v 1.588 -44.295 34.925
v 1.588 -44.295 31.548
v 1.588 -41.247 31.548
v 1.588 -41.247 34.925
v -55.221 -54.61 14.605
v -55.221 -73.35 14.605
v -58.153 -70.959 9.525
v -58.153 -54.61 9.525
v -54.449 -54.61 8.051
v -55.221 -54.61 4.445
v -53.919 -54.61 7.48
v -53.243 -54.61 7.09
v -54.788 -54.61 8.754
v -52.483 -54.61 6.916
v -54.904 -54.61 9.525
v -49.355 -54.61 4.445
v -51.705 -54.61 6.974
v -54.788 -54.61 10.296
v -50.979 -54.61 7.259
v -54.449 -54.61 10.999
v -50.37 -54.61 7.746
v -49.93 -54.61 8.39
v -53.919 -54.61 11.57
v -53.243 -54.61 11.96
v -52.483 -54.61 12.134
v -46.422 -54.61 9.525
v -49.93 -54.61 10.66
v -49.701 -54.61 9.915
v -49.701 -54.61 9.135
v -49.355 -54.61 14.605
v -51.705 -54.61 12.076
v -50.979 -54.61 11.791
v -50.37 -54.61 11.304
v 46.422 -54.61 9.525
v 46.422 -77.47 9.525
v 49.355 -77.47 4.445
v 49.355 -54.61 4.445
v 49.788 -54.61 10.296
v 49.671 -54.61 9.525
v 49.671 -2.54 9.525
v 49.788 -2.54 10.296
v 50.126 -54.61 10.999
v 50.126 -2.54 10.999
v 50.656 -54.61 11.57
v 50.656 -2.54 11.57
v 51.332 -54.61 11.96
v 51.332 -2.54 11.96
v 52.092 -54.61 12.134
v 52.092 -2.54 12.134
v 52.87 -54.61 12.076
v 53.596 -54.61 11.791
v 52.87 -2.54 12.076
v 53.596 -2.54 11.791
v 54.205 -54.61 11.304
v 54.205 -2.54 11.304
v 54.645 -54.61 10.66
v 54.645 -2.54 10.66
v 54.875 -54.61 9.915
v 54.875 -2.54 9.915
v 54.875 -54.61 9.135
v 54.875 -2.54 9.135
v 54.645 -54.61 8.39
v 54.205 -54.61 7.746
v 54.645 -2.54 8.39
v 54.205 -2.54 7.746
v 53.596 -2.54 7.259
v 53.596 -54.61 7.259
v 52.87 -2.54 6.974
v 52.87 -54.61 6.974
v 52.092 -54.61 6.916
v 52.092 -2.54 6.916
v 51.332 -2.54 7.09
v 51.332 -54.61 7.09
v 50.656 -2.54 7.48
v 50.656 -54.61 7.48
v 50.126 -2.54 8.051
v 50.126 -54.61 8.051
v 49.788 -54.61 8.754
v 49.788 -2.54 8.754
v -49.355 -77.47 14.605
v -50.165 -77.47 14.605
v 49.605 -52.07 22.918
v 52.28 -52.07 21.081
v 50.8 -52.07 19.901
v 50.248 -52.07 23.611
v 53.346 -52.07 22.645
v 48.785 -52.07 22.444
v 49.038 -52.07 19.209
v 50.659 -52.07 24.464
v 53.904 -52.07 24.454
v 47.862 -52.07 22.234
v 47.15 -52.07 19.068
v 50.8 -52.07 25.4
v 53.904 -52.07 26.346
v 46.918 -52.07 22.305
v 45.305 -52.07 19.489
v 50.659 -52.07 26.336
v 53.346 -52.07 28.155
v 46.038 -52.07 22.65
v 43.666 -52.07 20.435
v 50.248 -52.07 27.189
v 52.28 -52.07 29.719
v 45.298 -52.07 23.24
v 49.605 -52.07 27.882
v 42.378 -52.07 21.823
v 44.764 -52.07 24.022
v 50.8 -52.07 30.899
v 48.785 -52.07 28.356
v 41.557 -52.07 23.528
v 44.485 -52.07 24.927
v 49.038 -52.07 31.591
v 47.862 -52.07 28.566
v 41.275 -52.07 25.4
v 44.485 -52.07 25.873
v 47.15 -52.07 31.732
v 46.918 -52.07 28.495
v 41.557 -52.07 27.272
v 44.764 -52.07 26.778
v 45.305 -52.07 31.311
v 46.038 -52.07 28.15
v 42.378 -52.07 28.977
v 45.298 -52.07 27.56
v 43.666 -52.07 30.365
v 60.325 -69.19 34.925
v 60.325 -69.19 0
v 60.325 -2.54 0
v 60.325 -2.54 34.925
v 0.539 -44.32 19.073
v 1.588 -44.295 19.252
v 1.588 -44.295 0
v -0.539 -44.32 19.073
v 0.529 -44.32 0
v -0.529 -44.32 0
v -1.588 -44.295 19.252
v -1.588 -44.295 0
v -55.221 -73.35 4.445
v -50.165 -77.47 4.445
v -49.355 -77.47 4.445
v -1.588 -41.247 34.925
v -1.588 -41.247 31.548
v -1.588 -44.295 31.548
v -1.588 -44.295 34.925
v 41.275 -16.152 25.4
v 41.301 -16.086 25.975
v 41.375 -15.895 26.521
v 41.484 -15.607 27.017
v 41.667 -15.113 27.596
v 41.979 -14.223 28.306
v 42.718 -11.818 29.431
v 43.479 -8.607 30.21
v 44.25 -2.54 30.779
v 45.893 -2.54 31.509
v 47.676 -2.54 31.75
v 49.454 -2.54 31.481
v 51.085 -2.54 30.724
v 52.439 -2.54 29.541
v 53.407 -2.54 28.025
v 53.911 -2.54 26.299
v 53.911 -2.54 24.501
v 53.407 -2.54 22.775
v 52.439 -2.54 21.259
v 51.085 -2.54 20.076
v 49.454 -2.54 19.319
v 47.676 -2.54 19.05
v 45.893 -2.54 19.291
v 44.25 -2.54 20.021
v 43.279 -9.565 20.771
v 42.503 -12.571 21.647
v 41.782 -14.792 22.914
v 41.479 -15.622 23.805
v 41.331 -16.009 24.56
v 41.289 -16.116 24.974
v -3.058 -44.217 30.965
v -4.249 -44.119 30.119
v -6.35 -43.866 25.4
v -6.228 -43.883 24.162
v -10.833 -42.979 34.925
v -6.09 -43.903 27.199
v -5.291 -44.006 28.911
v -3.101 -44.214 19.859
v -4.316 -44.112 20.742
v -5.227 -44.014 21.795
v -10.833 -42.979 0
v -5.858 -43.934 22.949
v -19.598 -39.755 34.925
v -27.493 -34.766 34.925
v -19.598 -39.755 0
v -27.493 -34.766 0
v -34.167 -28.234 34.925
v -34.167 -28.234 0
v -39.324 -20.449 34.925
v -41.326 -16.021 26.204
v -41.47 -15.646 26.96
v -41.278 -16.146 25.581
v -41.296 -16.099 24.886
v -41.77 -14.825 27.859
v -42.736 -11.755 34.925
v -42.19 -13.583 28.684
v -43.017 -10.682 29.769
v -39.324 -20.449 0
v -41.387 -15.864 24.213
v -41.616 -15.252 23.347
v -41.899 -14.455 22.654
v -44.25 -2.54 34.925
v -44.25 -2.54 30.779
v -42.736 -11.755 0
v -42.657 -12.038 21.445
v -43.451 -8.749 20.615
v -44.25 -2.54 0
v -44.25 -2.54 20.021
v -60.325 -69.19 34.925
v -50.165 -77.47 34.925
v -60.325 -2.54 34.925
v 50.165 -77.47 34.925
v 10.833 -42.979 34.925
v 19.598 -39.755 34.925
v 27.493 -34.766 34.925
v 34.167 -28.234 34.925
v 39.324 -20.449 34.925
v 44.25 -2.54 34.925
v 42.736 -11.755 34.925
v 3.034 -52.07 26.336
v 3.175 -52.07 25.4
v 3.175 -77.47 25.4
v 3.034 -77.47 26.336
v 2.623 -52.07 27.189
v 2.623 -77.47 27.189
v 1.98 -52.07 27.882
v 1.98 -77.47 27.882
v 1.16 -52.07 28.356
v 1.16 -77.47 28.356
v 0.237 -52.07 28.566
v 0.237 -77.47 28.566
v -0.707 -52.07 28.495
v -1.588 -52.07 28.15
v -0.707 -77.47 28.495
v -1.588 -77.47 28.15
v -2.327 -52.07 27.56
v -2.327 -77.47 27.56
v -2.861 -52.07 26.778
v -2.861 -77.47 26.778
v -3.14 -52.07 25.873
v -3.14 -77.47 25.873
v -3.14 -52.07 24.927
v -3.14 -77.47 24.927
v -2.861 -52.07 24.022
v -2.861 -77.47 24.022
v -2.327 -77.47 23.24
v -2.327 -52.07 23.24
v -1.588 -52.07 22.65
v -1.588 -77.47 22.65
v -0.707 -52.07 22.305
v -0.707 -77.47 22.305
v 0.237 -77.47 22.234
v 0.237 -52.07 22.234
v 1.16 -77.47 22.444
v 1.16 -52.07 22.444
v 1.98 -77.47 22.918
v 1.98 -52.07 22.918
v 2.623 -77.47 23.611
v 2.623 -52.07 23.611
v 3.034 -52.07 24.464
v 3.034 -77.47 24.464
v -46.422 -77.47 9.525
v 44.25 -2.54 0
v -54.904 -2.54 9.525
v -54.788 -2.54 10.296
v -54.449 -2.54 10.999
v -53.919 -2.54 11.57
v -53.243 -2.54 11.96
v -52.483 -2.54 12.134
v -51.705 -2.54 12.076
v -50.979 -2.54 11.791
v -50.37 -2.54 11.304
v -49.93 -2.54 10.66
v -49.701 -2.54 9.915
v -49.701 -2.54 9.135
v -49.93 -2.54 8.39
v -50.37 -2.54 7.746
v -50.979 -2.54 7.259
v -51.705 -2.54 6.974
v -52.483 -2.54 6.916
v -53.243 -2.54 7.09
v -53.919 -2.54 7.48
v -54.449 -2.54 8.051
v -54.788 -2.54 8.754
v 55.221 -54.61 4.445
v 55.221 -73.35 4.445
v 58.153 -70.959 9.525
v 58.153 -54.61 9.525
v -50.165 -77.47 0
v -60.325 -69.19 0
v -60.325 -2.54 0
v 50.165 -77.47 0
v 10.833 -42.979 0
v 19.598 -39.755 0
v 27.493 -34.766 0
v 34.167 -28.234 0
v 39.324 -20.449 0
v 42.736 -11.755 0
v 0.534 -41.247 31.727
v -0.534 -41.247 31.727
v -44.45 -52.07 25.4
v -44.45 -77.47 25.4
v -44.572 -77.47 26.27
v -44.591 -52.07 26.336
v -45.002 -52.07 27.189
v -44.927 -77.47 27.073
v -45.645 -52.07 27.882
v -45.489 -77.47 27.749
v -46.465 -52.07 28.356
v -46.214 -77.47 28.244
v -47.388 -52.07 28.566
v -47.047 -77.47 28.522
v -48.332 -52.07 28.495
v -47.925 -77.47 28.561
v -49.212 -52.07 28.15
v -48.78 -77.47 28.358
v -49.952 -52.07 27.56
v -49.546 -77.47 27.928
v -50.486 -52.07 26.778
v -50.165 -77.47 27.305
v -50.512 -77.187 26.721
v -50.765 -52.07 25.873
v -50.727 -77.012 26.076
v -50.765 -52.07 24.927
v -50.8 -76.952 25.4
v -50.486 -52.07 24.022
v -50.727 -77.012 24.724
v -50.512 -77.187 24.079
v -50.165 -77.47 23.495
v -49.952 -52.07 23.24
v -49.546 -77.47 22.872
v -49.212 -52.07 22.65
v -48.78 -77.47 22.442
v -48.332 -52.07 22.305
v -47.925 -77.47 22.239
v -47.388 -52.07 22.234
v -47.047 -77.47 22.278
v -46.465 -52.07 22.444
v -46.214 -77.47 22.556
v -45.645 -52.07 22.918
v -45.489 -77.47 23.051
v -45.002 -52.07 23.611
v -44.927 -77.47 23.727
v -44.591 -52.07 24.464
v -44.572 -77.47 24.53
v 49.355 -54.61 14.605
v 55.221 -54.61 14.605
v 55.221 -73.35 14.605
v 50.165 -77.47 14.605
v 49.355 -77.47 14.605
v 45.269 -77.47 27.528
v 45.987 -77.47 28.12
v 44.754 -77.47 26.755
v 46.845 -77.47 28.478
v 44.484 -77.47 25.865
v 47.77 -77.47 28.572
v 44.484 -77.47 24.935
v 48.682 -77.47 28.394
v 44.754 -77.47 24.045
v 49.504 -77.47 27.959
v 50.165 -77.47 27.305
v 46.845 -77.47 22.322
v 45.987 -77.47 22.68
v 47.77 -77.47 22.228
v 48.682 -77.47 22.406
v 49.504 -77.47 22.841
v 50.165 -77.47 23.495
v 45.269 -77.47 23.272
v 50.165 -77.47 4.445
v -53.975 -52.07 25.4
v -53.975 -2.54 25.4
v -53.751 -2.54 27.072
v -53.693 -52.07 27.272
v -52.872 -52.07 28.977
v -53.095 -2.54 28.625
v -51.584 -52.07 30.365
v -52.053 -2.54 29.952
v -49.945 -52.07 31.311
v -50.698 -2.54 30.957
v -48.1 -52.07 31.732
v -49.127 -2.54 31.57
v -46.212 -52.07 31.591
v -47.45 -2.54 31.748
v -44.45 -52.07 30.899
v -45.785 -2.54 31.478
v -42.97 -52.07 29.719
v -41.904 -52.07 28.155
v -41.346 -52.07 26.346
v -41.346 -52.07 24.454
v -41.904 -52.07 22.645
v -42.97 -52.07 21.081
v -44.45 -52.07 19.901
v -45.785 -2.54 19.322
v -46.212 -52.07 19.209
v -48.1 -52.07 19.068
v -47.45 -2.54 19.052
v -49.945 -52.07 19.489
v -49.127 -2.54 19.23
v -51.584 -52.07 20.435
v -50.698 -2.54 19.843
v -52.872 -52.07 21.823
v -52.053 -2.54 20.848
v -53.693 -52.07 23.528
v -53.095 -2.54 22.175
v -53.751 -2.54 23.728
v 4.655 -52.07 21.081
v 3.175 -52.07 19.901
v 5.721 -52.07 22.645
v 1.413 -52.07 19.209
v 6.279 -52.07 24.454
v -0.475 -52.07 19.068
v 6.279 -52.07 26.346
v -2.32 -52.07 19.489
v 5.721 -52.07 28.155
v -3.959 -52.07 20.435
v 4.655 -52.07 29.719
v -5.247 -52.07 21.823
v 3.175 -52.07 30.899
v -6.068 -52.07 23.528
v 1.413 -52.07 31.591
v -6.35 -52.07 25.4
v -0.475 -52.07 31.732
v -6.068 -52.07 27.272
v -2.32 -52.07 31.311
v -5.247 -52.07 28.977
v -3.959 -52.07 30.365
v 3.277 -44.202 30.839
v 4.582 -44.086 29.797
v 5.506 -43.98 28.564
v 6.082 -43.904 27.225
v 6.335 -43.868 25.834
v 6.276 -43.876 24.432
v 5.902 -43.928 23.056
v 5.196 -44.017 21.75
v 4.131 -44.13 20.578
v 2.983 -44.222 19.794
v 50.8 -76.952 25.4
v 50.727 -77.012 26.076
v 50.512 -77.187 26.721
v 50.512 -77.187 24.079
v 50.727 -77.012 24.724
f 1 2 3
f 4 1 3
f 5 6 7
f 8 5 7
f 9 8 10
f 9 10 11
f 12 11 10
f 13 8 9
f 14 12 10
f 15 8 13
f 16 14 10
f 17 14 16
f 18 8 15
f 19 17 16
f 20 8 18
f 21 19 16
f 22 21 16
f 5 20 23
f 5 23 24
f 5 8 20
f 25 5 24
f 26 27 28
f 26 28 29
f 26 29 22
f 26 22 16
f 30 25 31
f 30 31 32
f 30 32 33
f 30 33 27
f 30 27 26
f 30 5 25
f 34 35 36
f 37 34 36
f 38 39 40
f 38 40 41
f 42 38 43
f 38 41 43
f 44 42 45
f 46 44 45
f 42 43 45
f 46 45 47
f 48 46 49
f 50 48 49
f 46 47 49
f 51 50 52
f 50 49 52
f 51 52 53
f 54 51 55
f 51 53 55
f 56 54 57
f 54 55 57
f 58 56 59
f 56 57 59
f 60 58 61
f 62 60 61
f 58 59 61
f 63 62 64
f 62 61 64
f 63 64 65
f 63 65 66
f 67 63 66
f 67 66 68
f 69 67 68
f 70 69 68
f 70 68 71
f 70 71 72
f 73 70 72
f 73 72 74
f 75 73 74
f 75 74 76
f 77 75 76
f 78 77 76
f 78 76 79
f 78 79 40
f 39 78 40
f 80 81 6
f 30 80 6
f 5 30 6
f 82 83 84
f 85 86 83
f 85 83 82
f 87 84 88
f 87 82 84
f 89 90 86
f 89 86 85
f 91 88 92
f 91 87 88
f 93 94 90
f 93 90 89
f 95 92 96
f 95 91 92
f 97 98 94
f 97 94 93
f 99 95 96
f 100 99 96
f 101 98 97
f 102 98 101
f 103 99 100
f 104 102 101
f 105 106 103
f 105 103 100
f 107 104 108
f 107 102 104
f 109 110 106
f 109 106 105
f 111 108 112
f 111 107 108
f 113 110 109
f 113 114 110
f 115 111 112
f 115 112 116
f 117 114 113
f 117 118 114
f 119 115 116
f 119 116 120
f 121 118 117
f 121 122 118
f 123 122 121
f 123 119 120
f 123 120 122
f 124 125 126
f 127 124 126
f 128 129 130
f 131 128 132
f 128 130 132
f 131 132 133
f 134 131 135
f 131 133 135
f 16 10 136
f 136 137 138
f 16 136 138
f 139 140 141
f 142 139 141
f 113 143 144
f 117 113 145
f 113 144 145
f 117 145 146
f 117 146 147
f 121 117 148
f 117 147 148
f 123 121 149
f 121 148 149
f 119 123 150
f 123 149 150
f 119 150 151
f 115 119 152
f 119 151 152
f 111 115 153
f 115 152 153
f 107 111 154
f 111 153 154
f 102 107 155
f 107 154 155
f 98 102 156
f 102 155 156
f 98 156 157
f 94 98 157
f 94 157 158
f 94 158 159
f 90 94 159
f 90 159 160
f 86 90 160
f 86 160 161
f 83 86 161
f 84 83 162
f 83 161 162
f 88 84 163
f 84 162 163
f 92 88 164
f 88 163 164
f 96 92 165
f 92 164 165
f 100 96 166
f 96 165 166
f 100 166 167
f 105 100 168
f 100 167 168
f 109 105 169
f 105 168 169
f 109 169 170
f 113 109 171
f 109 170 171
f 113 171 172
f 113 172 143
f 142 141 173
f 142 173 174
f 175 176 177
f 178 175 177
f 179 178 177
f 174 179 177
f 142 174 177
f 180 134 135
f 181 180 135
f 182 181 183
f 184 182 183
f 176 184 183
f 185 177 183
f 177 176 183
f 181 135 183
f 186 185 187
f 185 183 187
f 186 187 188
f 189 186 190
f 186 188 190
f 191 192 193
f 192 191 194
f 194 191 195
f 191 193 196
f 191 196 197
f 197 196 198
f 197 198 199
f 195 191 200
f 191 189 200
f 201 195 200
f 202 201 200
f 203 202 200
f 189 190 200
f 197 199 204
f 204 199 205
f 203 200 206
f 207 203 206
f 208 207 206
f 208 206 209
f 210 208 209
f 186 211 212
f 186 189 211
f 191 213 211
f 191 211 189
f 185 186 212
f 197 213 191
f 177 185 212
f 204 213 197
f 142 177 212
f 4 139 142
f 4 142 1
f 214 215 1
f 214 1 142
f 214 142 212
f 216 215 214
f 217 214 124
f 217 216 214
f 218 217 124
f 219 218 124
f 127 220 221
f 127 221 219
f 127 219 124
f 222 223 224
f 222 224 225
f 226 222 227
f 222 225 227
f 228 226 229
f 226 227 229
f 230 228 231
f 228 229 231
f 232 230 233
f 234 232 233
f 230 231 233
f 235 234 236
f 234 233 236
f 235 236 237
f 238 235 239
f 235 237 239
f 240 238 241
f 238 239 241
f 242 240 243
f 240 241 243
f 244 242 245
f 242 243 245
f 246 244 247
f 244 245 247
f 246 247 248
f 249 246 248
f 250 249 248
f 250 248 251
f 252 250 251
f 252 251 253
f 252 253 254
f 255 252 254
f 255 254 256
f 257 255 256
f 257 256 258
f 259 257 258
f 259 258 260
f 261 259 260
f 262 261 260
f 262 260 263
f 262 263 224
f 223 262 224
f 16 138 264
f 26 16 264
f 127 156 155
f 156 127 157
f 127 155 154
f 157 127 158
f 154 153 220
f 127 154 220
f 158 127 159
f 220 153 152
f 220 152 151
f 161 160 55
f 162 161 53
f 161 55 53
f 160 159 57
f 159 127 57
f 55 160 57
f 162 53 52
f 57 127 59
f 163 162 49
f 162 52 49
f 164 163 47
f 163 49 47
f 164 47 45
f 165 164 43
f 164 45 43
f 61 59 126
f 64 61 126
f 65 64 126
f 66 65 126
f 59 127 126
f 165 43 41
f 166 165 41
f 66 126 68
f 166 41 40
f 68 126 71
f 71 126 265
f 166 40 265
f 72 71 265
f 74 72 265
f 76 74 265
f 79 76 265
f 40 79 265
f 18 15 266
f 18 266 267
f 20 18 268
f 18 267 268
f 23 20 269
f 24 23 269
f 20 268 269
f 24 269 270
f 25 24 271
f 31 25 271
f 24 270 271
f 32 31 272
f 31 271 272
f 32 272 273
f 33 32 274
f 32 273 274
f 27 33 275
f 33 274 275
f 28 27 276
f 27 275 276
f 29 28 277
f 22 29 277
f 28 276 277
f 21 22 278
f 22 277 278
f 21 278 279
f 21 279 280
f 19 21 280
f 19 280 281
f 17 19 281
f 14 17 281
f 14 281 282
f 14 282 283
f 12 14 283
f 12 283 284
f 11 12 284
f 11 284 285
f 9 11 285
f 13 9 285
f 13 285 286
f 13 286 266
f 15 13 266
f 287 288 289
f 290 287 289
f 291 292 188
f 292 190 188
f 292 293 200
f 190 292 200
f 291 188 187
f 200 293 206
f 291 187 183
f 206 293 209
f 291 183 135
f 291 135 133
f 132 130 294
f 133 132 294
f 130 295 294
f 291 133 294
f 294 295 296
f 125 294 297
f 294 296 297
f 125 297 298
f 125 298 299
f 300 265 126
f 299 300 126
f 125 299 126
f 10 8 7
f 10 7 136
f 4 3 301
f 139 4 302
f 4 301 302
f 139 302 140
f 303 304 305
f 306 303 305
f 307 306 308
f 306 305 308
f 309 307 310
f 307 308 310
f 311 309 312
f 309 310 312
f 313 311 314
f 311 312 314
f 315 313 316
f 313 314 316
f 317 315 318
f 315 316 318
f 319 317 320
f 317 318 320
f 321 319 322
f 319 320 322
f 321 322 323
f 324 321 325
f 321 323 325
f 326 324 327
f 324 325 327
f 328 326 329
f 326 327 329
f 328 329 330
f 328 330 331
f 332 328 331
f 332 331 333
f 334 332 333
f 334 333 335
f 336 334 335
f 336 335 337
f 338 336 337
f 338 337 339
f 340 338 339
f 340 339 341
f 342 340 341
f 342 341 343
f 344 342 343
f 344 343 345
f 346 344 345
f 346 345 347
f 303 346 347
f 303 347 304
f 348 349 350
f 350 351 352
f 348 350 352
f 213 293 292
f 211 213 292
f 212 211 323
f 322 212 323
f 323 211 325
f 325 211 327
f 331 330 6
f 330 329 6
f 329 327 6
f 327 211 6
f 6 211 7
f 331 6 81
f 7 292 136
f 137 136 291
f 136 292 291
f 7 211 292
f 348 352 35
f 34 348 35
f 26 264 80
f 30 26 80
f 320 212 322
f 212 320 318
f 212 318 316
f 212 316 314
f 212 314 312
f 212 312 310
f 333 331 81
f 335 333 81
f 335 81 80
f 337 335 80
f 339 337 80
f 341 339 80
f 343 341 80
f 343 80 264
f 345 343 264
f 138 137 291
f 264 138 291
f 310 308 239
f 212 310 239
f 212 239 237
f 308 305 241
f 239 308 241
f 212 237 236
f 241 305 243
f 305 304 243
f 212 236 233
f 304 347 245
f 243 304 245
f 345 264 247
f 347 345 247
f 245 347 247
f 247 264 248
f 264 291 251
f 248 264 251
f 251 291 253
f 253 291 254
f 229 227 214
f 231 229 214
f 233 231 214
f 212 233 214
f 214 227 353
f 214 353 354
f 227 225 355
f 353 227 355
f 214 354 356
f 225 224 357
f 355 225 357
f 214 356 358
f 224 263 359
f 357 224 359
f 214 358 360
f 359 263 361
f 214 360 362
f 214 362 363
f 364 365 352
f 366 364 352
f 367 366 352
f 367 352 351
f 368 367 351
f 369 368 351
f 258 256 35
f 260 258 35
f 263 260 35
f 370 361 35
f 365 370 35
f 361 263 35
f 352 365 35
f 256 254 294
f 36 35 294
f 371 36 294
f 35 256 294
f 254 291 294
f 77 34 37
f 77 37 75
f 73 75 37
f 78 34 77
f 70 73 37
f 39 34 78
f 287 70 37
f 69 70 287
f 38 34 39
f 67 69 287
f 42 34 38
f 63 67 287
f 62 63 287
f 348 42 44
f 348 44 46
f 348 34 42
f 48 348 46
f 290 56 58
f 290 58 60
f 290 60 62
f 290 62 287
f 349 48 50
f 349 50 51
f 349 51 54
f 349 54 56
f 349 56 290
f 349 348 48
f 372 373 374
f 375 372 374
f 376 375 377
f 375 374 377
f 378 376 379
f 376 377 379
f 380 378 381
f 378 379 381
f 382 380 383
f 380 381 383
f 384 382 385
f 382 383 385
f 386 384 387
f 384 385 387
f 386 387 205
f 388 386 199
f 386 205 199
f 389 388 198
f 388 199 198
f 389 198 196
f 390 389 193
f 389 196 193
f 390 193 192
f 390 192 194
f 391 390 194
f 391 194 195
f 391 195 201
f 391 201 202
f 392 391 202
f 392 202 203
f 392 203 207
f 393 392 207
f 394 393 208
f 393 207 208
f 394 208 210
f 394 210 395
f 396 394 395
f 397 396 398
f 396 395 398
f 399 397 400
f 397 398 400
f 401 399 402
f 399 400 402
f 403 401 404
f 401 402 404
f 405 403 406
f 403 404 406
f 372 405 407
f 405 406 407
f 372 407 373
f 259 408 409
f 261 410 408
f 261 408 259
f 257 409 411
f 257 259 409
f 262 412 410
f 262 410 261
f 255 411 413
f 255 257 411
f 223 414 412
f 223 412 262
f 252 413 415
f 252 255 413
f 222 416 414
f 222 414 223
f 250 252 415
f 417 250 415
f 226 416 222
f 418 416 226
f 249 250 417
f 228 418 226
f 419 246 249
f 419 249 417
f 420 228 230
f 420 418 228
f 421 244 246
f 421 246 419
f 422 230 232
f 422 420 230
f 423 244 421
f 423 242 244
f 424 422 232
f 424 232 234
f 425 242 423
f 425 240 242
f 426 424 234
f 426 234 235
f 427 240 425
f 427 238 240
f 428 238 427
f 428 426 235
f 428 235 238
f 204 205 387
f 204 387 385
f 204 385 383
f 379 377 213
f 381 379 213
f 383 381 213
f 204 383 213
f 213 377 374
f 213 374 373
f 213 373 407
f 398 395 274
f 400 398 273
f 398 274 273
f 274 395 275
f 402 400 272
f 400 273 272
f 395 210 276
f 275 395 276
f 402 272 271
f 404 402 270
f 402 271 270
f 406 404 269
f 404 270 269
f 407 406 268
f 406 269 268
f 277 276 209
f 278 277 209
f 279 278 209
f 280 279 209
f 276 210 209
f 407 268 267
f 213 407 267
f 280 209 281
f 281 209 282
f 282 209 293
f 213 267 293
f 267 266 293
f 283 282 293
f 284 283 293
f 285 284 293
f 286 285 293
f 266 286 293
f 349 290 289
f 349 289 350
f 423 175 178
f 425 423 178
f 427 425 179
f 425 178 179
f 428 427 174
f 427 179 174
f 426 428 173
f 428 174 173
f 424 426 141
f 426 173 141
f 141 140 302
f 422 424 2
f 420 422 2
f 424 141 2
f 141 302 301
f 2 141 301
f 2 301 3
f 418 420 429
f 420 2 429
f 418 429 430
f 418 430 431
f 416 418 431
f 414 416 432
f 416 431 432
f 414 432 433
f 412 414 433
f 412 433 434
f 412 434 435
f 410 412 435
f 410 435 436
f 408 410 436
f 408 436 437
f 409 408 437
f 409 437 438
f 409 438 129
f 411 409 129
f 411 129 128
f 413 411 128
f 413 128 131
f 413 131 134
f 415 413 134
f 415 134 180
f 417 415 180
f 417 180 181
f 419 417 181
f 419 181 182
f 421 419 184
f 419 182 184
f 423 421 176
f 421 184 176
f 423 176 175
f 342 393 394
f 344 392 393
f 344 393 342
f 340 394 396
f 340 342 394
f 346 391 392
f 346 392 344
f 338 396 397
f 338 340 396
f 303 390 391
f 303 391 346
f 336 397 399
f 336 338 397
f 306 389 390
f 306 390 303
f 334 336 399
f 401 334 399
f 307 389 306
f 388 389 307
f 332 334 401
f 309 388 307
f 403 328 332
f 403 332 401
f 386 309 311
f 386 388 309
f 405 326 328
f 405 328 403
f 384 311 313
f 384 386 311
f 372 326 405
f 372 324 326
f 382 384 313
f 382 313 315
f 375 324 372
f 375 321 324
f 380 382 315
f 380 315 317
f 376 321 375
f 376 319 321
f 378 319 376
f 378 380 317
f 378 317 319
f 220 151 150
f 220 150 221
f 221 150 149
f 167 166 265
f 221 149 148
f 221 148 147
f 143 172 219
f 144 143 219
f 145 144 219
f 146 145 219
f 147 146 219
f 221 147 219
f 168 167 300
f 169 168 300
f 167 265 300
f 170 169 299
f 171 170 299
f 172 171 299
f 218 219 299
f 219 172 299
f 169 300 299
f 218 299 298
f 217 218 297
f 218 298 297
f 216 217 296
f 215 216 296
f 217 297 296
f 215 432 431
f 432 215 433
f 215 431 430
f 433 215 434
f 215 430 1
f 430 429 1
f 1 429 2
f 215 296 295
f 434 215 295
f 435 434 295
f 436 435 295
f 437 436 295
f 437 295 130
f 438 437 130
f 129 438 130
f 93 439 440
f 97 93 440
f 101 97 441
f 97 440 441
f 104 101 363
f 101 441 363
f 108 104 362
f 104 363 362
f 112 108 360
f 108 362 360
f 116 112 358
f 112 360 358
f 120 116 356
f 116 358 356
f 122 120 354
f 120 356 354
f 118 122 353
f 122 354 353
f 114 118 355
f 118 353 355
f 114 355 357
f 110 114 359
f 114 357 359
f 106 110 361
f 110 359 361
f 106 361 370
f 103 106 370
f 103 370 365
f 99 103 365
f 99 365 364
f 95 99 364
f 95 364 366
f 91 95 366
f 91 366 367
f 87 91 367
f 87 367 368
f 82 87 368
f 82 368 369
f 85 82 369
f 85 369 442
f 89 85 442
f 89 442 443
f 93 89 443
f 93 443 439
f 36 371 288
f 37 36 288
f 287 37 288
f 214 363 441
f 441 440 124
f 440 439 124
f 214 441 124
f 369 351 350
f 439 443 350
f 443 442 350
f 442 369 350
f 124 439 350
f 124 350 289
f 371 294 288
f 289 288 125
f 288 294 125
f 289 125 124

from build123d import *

# Parameters (mm, degrees)
F1_DEPTH  = 34.925
F2_R      = 2.6162
F3_DEPTH  = 74.931
F4_R      = 2.6162
F5_DEPTH  = 74.931
F6_R      = 3.175
F7_DEPTH  = 74.931
F8_R      = 6.35
F9_DEPTH  = 49.53
F11_DEPTH = 22.86
F13_DEPTH = 25.4


with BuildPart() as f1:
    # F0 (on Top) → F1 (new body)
    with BuildSketch(Plane.XY):
        with BuildLine():
            ThreePointArc((-1.5875, -44.294561), (-31.002155, -31.676406), (-44.250161, -2.54))
            Line((-44.250161, -2.54), (-60.325, -2.54))
            Line((-60.325, -2.54), (-60.325, -69.1896))
            Line((-60.325, -69.1896), (-50.165, -77.47))
            Line((-50.165, -77.47), (50.165, -77.47))
            Line((50.165, -77.47), (60.325, -69.1896))
            Line((60.325, -69.1896), (60.325, -2.54))
            Line((60.325, -2.54), (44.250161, -2.54))
            ThreePointArc((44.250161, -2.54), (31.002155, -31.676406), (1.5875, -44.294561))
            Line((1.5875, -44.294561), (1.5875, -41.246561))
            Line((1.5875, -41.246561), (-1.5875, -41.246561))
            Line((-1.5875, -41.246561), (-1.5875, -44.294561))
        make_face()
    extrude(amount=F1_DEPTH)

    # F2 (on face) → F3 (cut, through all)
    with BuildSketch(Plane(origin=(0, -2.54, 0), x_dir=(-1, 0, 0), z_dir=(0, 1, 0))):
        with Locations((-52.28758, 9.525)):
            Circle(F2_R)
    extrude(amount=-F3_DEPTH, mode=Mode.SUBTRACT)

    # F4 (on face) → F5 (cut, through all)
    with BuildSketch(Plane(origin=(0, -2.54, 0), x_dir=(-1, 0, 0), z_dir=(0, 1, 0))):
        with Locations((52.28758, 9.525)):
            Circle(F4_R)
    extrude(amount=-F5_DEPTH, mode=Mode.SUBTRACT)

    # F6 (on face) → F7 (cut, through all)
    with BuildSketch(Plane.XZ.offset(77.47)):
        with Locations((-47.625, 25.4)):
            Circle(F6_R)
        with Locations((47.625, 25.4)):
            Circle(F6_R)
        with Locations((0, 25.4)):
            Circle(F6_R)
    extrude(amount=-F7_DEPTH, mode=Mode.SUBTRACT)

    # F8 (on face) → F9 (cut)
    with BuildSketch(Plane(origin=(0, -2.54, 0), x_dir=(-1, 0, 0), z_dir=(0, 1, 0))):
        with Locations((-47.625, 25.4)):
            Circle(F8_R)
        with Locations((0, 25.4)):
            Circle(F8_R)
        with Locations((47.625, 25.4)):
            Circle(F8_R)
    extrude(amount=-F9_DEPTH, mode=Mode.SUBTRACT)

    # F10 (on face) → F11 (cut)
    with BuildSketch(Plane.XZ.offset(77.47)):
        Polygon((-49.354641, 4.445), (-46.421702, 9.525), (-49.354641, 14.605), (-55.22052, 14.605), (-58.153459, 9.525), (-55.22052, 4.445), align=None)
        Polygon((49.354641, 14.605), (46.421702, 9.525), (49.354641, 4.445), (55.22052, 4.445), (58.153459, 9.525), (55.22052, 14.605), align=None)
    extrude(amount=-F11_DEPTH, mode=Mode.SUBTRACT)

    # F12 (on face) → F13 (cut)
    with BuildSketch(Plane(origin=(0, 0, 0), x_dir=(1, 0, 0), z_dir=(0, 0, -1))):
        with BuildLine():
            Line((1.5875, 41.246561), (1.5875, 44.294561))
            ThreePointArc((1.5875, 44.294561), (0, 44.323), (-1.5875, 44.294561))
            Line((-1.5875, 44.294561), (-1.5875, 41.246561))
            Line((-1.5875, 41.246561), (1.5875, 41.246561))
        make_face()
    extrude(amount=-F13_DEPTH, mode=Mode.SUBTRACT)


solid = f1.part
